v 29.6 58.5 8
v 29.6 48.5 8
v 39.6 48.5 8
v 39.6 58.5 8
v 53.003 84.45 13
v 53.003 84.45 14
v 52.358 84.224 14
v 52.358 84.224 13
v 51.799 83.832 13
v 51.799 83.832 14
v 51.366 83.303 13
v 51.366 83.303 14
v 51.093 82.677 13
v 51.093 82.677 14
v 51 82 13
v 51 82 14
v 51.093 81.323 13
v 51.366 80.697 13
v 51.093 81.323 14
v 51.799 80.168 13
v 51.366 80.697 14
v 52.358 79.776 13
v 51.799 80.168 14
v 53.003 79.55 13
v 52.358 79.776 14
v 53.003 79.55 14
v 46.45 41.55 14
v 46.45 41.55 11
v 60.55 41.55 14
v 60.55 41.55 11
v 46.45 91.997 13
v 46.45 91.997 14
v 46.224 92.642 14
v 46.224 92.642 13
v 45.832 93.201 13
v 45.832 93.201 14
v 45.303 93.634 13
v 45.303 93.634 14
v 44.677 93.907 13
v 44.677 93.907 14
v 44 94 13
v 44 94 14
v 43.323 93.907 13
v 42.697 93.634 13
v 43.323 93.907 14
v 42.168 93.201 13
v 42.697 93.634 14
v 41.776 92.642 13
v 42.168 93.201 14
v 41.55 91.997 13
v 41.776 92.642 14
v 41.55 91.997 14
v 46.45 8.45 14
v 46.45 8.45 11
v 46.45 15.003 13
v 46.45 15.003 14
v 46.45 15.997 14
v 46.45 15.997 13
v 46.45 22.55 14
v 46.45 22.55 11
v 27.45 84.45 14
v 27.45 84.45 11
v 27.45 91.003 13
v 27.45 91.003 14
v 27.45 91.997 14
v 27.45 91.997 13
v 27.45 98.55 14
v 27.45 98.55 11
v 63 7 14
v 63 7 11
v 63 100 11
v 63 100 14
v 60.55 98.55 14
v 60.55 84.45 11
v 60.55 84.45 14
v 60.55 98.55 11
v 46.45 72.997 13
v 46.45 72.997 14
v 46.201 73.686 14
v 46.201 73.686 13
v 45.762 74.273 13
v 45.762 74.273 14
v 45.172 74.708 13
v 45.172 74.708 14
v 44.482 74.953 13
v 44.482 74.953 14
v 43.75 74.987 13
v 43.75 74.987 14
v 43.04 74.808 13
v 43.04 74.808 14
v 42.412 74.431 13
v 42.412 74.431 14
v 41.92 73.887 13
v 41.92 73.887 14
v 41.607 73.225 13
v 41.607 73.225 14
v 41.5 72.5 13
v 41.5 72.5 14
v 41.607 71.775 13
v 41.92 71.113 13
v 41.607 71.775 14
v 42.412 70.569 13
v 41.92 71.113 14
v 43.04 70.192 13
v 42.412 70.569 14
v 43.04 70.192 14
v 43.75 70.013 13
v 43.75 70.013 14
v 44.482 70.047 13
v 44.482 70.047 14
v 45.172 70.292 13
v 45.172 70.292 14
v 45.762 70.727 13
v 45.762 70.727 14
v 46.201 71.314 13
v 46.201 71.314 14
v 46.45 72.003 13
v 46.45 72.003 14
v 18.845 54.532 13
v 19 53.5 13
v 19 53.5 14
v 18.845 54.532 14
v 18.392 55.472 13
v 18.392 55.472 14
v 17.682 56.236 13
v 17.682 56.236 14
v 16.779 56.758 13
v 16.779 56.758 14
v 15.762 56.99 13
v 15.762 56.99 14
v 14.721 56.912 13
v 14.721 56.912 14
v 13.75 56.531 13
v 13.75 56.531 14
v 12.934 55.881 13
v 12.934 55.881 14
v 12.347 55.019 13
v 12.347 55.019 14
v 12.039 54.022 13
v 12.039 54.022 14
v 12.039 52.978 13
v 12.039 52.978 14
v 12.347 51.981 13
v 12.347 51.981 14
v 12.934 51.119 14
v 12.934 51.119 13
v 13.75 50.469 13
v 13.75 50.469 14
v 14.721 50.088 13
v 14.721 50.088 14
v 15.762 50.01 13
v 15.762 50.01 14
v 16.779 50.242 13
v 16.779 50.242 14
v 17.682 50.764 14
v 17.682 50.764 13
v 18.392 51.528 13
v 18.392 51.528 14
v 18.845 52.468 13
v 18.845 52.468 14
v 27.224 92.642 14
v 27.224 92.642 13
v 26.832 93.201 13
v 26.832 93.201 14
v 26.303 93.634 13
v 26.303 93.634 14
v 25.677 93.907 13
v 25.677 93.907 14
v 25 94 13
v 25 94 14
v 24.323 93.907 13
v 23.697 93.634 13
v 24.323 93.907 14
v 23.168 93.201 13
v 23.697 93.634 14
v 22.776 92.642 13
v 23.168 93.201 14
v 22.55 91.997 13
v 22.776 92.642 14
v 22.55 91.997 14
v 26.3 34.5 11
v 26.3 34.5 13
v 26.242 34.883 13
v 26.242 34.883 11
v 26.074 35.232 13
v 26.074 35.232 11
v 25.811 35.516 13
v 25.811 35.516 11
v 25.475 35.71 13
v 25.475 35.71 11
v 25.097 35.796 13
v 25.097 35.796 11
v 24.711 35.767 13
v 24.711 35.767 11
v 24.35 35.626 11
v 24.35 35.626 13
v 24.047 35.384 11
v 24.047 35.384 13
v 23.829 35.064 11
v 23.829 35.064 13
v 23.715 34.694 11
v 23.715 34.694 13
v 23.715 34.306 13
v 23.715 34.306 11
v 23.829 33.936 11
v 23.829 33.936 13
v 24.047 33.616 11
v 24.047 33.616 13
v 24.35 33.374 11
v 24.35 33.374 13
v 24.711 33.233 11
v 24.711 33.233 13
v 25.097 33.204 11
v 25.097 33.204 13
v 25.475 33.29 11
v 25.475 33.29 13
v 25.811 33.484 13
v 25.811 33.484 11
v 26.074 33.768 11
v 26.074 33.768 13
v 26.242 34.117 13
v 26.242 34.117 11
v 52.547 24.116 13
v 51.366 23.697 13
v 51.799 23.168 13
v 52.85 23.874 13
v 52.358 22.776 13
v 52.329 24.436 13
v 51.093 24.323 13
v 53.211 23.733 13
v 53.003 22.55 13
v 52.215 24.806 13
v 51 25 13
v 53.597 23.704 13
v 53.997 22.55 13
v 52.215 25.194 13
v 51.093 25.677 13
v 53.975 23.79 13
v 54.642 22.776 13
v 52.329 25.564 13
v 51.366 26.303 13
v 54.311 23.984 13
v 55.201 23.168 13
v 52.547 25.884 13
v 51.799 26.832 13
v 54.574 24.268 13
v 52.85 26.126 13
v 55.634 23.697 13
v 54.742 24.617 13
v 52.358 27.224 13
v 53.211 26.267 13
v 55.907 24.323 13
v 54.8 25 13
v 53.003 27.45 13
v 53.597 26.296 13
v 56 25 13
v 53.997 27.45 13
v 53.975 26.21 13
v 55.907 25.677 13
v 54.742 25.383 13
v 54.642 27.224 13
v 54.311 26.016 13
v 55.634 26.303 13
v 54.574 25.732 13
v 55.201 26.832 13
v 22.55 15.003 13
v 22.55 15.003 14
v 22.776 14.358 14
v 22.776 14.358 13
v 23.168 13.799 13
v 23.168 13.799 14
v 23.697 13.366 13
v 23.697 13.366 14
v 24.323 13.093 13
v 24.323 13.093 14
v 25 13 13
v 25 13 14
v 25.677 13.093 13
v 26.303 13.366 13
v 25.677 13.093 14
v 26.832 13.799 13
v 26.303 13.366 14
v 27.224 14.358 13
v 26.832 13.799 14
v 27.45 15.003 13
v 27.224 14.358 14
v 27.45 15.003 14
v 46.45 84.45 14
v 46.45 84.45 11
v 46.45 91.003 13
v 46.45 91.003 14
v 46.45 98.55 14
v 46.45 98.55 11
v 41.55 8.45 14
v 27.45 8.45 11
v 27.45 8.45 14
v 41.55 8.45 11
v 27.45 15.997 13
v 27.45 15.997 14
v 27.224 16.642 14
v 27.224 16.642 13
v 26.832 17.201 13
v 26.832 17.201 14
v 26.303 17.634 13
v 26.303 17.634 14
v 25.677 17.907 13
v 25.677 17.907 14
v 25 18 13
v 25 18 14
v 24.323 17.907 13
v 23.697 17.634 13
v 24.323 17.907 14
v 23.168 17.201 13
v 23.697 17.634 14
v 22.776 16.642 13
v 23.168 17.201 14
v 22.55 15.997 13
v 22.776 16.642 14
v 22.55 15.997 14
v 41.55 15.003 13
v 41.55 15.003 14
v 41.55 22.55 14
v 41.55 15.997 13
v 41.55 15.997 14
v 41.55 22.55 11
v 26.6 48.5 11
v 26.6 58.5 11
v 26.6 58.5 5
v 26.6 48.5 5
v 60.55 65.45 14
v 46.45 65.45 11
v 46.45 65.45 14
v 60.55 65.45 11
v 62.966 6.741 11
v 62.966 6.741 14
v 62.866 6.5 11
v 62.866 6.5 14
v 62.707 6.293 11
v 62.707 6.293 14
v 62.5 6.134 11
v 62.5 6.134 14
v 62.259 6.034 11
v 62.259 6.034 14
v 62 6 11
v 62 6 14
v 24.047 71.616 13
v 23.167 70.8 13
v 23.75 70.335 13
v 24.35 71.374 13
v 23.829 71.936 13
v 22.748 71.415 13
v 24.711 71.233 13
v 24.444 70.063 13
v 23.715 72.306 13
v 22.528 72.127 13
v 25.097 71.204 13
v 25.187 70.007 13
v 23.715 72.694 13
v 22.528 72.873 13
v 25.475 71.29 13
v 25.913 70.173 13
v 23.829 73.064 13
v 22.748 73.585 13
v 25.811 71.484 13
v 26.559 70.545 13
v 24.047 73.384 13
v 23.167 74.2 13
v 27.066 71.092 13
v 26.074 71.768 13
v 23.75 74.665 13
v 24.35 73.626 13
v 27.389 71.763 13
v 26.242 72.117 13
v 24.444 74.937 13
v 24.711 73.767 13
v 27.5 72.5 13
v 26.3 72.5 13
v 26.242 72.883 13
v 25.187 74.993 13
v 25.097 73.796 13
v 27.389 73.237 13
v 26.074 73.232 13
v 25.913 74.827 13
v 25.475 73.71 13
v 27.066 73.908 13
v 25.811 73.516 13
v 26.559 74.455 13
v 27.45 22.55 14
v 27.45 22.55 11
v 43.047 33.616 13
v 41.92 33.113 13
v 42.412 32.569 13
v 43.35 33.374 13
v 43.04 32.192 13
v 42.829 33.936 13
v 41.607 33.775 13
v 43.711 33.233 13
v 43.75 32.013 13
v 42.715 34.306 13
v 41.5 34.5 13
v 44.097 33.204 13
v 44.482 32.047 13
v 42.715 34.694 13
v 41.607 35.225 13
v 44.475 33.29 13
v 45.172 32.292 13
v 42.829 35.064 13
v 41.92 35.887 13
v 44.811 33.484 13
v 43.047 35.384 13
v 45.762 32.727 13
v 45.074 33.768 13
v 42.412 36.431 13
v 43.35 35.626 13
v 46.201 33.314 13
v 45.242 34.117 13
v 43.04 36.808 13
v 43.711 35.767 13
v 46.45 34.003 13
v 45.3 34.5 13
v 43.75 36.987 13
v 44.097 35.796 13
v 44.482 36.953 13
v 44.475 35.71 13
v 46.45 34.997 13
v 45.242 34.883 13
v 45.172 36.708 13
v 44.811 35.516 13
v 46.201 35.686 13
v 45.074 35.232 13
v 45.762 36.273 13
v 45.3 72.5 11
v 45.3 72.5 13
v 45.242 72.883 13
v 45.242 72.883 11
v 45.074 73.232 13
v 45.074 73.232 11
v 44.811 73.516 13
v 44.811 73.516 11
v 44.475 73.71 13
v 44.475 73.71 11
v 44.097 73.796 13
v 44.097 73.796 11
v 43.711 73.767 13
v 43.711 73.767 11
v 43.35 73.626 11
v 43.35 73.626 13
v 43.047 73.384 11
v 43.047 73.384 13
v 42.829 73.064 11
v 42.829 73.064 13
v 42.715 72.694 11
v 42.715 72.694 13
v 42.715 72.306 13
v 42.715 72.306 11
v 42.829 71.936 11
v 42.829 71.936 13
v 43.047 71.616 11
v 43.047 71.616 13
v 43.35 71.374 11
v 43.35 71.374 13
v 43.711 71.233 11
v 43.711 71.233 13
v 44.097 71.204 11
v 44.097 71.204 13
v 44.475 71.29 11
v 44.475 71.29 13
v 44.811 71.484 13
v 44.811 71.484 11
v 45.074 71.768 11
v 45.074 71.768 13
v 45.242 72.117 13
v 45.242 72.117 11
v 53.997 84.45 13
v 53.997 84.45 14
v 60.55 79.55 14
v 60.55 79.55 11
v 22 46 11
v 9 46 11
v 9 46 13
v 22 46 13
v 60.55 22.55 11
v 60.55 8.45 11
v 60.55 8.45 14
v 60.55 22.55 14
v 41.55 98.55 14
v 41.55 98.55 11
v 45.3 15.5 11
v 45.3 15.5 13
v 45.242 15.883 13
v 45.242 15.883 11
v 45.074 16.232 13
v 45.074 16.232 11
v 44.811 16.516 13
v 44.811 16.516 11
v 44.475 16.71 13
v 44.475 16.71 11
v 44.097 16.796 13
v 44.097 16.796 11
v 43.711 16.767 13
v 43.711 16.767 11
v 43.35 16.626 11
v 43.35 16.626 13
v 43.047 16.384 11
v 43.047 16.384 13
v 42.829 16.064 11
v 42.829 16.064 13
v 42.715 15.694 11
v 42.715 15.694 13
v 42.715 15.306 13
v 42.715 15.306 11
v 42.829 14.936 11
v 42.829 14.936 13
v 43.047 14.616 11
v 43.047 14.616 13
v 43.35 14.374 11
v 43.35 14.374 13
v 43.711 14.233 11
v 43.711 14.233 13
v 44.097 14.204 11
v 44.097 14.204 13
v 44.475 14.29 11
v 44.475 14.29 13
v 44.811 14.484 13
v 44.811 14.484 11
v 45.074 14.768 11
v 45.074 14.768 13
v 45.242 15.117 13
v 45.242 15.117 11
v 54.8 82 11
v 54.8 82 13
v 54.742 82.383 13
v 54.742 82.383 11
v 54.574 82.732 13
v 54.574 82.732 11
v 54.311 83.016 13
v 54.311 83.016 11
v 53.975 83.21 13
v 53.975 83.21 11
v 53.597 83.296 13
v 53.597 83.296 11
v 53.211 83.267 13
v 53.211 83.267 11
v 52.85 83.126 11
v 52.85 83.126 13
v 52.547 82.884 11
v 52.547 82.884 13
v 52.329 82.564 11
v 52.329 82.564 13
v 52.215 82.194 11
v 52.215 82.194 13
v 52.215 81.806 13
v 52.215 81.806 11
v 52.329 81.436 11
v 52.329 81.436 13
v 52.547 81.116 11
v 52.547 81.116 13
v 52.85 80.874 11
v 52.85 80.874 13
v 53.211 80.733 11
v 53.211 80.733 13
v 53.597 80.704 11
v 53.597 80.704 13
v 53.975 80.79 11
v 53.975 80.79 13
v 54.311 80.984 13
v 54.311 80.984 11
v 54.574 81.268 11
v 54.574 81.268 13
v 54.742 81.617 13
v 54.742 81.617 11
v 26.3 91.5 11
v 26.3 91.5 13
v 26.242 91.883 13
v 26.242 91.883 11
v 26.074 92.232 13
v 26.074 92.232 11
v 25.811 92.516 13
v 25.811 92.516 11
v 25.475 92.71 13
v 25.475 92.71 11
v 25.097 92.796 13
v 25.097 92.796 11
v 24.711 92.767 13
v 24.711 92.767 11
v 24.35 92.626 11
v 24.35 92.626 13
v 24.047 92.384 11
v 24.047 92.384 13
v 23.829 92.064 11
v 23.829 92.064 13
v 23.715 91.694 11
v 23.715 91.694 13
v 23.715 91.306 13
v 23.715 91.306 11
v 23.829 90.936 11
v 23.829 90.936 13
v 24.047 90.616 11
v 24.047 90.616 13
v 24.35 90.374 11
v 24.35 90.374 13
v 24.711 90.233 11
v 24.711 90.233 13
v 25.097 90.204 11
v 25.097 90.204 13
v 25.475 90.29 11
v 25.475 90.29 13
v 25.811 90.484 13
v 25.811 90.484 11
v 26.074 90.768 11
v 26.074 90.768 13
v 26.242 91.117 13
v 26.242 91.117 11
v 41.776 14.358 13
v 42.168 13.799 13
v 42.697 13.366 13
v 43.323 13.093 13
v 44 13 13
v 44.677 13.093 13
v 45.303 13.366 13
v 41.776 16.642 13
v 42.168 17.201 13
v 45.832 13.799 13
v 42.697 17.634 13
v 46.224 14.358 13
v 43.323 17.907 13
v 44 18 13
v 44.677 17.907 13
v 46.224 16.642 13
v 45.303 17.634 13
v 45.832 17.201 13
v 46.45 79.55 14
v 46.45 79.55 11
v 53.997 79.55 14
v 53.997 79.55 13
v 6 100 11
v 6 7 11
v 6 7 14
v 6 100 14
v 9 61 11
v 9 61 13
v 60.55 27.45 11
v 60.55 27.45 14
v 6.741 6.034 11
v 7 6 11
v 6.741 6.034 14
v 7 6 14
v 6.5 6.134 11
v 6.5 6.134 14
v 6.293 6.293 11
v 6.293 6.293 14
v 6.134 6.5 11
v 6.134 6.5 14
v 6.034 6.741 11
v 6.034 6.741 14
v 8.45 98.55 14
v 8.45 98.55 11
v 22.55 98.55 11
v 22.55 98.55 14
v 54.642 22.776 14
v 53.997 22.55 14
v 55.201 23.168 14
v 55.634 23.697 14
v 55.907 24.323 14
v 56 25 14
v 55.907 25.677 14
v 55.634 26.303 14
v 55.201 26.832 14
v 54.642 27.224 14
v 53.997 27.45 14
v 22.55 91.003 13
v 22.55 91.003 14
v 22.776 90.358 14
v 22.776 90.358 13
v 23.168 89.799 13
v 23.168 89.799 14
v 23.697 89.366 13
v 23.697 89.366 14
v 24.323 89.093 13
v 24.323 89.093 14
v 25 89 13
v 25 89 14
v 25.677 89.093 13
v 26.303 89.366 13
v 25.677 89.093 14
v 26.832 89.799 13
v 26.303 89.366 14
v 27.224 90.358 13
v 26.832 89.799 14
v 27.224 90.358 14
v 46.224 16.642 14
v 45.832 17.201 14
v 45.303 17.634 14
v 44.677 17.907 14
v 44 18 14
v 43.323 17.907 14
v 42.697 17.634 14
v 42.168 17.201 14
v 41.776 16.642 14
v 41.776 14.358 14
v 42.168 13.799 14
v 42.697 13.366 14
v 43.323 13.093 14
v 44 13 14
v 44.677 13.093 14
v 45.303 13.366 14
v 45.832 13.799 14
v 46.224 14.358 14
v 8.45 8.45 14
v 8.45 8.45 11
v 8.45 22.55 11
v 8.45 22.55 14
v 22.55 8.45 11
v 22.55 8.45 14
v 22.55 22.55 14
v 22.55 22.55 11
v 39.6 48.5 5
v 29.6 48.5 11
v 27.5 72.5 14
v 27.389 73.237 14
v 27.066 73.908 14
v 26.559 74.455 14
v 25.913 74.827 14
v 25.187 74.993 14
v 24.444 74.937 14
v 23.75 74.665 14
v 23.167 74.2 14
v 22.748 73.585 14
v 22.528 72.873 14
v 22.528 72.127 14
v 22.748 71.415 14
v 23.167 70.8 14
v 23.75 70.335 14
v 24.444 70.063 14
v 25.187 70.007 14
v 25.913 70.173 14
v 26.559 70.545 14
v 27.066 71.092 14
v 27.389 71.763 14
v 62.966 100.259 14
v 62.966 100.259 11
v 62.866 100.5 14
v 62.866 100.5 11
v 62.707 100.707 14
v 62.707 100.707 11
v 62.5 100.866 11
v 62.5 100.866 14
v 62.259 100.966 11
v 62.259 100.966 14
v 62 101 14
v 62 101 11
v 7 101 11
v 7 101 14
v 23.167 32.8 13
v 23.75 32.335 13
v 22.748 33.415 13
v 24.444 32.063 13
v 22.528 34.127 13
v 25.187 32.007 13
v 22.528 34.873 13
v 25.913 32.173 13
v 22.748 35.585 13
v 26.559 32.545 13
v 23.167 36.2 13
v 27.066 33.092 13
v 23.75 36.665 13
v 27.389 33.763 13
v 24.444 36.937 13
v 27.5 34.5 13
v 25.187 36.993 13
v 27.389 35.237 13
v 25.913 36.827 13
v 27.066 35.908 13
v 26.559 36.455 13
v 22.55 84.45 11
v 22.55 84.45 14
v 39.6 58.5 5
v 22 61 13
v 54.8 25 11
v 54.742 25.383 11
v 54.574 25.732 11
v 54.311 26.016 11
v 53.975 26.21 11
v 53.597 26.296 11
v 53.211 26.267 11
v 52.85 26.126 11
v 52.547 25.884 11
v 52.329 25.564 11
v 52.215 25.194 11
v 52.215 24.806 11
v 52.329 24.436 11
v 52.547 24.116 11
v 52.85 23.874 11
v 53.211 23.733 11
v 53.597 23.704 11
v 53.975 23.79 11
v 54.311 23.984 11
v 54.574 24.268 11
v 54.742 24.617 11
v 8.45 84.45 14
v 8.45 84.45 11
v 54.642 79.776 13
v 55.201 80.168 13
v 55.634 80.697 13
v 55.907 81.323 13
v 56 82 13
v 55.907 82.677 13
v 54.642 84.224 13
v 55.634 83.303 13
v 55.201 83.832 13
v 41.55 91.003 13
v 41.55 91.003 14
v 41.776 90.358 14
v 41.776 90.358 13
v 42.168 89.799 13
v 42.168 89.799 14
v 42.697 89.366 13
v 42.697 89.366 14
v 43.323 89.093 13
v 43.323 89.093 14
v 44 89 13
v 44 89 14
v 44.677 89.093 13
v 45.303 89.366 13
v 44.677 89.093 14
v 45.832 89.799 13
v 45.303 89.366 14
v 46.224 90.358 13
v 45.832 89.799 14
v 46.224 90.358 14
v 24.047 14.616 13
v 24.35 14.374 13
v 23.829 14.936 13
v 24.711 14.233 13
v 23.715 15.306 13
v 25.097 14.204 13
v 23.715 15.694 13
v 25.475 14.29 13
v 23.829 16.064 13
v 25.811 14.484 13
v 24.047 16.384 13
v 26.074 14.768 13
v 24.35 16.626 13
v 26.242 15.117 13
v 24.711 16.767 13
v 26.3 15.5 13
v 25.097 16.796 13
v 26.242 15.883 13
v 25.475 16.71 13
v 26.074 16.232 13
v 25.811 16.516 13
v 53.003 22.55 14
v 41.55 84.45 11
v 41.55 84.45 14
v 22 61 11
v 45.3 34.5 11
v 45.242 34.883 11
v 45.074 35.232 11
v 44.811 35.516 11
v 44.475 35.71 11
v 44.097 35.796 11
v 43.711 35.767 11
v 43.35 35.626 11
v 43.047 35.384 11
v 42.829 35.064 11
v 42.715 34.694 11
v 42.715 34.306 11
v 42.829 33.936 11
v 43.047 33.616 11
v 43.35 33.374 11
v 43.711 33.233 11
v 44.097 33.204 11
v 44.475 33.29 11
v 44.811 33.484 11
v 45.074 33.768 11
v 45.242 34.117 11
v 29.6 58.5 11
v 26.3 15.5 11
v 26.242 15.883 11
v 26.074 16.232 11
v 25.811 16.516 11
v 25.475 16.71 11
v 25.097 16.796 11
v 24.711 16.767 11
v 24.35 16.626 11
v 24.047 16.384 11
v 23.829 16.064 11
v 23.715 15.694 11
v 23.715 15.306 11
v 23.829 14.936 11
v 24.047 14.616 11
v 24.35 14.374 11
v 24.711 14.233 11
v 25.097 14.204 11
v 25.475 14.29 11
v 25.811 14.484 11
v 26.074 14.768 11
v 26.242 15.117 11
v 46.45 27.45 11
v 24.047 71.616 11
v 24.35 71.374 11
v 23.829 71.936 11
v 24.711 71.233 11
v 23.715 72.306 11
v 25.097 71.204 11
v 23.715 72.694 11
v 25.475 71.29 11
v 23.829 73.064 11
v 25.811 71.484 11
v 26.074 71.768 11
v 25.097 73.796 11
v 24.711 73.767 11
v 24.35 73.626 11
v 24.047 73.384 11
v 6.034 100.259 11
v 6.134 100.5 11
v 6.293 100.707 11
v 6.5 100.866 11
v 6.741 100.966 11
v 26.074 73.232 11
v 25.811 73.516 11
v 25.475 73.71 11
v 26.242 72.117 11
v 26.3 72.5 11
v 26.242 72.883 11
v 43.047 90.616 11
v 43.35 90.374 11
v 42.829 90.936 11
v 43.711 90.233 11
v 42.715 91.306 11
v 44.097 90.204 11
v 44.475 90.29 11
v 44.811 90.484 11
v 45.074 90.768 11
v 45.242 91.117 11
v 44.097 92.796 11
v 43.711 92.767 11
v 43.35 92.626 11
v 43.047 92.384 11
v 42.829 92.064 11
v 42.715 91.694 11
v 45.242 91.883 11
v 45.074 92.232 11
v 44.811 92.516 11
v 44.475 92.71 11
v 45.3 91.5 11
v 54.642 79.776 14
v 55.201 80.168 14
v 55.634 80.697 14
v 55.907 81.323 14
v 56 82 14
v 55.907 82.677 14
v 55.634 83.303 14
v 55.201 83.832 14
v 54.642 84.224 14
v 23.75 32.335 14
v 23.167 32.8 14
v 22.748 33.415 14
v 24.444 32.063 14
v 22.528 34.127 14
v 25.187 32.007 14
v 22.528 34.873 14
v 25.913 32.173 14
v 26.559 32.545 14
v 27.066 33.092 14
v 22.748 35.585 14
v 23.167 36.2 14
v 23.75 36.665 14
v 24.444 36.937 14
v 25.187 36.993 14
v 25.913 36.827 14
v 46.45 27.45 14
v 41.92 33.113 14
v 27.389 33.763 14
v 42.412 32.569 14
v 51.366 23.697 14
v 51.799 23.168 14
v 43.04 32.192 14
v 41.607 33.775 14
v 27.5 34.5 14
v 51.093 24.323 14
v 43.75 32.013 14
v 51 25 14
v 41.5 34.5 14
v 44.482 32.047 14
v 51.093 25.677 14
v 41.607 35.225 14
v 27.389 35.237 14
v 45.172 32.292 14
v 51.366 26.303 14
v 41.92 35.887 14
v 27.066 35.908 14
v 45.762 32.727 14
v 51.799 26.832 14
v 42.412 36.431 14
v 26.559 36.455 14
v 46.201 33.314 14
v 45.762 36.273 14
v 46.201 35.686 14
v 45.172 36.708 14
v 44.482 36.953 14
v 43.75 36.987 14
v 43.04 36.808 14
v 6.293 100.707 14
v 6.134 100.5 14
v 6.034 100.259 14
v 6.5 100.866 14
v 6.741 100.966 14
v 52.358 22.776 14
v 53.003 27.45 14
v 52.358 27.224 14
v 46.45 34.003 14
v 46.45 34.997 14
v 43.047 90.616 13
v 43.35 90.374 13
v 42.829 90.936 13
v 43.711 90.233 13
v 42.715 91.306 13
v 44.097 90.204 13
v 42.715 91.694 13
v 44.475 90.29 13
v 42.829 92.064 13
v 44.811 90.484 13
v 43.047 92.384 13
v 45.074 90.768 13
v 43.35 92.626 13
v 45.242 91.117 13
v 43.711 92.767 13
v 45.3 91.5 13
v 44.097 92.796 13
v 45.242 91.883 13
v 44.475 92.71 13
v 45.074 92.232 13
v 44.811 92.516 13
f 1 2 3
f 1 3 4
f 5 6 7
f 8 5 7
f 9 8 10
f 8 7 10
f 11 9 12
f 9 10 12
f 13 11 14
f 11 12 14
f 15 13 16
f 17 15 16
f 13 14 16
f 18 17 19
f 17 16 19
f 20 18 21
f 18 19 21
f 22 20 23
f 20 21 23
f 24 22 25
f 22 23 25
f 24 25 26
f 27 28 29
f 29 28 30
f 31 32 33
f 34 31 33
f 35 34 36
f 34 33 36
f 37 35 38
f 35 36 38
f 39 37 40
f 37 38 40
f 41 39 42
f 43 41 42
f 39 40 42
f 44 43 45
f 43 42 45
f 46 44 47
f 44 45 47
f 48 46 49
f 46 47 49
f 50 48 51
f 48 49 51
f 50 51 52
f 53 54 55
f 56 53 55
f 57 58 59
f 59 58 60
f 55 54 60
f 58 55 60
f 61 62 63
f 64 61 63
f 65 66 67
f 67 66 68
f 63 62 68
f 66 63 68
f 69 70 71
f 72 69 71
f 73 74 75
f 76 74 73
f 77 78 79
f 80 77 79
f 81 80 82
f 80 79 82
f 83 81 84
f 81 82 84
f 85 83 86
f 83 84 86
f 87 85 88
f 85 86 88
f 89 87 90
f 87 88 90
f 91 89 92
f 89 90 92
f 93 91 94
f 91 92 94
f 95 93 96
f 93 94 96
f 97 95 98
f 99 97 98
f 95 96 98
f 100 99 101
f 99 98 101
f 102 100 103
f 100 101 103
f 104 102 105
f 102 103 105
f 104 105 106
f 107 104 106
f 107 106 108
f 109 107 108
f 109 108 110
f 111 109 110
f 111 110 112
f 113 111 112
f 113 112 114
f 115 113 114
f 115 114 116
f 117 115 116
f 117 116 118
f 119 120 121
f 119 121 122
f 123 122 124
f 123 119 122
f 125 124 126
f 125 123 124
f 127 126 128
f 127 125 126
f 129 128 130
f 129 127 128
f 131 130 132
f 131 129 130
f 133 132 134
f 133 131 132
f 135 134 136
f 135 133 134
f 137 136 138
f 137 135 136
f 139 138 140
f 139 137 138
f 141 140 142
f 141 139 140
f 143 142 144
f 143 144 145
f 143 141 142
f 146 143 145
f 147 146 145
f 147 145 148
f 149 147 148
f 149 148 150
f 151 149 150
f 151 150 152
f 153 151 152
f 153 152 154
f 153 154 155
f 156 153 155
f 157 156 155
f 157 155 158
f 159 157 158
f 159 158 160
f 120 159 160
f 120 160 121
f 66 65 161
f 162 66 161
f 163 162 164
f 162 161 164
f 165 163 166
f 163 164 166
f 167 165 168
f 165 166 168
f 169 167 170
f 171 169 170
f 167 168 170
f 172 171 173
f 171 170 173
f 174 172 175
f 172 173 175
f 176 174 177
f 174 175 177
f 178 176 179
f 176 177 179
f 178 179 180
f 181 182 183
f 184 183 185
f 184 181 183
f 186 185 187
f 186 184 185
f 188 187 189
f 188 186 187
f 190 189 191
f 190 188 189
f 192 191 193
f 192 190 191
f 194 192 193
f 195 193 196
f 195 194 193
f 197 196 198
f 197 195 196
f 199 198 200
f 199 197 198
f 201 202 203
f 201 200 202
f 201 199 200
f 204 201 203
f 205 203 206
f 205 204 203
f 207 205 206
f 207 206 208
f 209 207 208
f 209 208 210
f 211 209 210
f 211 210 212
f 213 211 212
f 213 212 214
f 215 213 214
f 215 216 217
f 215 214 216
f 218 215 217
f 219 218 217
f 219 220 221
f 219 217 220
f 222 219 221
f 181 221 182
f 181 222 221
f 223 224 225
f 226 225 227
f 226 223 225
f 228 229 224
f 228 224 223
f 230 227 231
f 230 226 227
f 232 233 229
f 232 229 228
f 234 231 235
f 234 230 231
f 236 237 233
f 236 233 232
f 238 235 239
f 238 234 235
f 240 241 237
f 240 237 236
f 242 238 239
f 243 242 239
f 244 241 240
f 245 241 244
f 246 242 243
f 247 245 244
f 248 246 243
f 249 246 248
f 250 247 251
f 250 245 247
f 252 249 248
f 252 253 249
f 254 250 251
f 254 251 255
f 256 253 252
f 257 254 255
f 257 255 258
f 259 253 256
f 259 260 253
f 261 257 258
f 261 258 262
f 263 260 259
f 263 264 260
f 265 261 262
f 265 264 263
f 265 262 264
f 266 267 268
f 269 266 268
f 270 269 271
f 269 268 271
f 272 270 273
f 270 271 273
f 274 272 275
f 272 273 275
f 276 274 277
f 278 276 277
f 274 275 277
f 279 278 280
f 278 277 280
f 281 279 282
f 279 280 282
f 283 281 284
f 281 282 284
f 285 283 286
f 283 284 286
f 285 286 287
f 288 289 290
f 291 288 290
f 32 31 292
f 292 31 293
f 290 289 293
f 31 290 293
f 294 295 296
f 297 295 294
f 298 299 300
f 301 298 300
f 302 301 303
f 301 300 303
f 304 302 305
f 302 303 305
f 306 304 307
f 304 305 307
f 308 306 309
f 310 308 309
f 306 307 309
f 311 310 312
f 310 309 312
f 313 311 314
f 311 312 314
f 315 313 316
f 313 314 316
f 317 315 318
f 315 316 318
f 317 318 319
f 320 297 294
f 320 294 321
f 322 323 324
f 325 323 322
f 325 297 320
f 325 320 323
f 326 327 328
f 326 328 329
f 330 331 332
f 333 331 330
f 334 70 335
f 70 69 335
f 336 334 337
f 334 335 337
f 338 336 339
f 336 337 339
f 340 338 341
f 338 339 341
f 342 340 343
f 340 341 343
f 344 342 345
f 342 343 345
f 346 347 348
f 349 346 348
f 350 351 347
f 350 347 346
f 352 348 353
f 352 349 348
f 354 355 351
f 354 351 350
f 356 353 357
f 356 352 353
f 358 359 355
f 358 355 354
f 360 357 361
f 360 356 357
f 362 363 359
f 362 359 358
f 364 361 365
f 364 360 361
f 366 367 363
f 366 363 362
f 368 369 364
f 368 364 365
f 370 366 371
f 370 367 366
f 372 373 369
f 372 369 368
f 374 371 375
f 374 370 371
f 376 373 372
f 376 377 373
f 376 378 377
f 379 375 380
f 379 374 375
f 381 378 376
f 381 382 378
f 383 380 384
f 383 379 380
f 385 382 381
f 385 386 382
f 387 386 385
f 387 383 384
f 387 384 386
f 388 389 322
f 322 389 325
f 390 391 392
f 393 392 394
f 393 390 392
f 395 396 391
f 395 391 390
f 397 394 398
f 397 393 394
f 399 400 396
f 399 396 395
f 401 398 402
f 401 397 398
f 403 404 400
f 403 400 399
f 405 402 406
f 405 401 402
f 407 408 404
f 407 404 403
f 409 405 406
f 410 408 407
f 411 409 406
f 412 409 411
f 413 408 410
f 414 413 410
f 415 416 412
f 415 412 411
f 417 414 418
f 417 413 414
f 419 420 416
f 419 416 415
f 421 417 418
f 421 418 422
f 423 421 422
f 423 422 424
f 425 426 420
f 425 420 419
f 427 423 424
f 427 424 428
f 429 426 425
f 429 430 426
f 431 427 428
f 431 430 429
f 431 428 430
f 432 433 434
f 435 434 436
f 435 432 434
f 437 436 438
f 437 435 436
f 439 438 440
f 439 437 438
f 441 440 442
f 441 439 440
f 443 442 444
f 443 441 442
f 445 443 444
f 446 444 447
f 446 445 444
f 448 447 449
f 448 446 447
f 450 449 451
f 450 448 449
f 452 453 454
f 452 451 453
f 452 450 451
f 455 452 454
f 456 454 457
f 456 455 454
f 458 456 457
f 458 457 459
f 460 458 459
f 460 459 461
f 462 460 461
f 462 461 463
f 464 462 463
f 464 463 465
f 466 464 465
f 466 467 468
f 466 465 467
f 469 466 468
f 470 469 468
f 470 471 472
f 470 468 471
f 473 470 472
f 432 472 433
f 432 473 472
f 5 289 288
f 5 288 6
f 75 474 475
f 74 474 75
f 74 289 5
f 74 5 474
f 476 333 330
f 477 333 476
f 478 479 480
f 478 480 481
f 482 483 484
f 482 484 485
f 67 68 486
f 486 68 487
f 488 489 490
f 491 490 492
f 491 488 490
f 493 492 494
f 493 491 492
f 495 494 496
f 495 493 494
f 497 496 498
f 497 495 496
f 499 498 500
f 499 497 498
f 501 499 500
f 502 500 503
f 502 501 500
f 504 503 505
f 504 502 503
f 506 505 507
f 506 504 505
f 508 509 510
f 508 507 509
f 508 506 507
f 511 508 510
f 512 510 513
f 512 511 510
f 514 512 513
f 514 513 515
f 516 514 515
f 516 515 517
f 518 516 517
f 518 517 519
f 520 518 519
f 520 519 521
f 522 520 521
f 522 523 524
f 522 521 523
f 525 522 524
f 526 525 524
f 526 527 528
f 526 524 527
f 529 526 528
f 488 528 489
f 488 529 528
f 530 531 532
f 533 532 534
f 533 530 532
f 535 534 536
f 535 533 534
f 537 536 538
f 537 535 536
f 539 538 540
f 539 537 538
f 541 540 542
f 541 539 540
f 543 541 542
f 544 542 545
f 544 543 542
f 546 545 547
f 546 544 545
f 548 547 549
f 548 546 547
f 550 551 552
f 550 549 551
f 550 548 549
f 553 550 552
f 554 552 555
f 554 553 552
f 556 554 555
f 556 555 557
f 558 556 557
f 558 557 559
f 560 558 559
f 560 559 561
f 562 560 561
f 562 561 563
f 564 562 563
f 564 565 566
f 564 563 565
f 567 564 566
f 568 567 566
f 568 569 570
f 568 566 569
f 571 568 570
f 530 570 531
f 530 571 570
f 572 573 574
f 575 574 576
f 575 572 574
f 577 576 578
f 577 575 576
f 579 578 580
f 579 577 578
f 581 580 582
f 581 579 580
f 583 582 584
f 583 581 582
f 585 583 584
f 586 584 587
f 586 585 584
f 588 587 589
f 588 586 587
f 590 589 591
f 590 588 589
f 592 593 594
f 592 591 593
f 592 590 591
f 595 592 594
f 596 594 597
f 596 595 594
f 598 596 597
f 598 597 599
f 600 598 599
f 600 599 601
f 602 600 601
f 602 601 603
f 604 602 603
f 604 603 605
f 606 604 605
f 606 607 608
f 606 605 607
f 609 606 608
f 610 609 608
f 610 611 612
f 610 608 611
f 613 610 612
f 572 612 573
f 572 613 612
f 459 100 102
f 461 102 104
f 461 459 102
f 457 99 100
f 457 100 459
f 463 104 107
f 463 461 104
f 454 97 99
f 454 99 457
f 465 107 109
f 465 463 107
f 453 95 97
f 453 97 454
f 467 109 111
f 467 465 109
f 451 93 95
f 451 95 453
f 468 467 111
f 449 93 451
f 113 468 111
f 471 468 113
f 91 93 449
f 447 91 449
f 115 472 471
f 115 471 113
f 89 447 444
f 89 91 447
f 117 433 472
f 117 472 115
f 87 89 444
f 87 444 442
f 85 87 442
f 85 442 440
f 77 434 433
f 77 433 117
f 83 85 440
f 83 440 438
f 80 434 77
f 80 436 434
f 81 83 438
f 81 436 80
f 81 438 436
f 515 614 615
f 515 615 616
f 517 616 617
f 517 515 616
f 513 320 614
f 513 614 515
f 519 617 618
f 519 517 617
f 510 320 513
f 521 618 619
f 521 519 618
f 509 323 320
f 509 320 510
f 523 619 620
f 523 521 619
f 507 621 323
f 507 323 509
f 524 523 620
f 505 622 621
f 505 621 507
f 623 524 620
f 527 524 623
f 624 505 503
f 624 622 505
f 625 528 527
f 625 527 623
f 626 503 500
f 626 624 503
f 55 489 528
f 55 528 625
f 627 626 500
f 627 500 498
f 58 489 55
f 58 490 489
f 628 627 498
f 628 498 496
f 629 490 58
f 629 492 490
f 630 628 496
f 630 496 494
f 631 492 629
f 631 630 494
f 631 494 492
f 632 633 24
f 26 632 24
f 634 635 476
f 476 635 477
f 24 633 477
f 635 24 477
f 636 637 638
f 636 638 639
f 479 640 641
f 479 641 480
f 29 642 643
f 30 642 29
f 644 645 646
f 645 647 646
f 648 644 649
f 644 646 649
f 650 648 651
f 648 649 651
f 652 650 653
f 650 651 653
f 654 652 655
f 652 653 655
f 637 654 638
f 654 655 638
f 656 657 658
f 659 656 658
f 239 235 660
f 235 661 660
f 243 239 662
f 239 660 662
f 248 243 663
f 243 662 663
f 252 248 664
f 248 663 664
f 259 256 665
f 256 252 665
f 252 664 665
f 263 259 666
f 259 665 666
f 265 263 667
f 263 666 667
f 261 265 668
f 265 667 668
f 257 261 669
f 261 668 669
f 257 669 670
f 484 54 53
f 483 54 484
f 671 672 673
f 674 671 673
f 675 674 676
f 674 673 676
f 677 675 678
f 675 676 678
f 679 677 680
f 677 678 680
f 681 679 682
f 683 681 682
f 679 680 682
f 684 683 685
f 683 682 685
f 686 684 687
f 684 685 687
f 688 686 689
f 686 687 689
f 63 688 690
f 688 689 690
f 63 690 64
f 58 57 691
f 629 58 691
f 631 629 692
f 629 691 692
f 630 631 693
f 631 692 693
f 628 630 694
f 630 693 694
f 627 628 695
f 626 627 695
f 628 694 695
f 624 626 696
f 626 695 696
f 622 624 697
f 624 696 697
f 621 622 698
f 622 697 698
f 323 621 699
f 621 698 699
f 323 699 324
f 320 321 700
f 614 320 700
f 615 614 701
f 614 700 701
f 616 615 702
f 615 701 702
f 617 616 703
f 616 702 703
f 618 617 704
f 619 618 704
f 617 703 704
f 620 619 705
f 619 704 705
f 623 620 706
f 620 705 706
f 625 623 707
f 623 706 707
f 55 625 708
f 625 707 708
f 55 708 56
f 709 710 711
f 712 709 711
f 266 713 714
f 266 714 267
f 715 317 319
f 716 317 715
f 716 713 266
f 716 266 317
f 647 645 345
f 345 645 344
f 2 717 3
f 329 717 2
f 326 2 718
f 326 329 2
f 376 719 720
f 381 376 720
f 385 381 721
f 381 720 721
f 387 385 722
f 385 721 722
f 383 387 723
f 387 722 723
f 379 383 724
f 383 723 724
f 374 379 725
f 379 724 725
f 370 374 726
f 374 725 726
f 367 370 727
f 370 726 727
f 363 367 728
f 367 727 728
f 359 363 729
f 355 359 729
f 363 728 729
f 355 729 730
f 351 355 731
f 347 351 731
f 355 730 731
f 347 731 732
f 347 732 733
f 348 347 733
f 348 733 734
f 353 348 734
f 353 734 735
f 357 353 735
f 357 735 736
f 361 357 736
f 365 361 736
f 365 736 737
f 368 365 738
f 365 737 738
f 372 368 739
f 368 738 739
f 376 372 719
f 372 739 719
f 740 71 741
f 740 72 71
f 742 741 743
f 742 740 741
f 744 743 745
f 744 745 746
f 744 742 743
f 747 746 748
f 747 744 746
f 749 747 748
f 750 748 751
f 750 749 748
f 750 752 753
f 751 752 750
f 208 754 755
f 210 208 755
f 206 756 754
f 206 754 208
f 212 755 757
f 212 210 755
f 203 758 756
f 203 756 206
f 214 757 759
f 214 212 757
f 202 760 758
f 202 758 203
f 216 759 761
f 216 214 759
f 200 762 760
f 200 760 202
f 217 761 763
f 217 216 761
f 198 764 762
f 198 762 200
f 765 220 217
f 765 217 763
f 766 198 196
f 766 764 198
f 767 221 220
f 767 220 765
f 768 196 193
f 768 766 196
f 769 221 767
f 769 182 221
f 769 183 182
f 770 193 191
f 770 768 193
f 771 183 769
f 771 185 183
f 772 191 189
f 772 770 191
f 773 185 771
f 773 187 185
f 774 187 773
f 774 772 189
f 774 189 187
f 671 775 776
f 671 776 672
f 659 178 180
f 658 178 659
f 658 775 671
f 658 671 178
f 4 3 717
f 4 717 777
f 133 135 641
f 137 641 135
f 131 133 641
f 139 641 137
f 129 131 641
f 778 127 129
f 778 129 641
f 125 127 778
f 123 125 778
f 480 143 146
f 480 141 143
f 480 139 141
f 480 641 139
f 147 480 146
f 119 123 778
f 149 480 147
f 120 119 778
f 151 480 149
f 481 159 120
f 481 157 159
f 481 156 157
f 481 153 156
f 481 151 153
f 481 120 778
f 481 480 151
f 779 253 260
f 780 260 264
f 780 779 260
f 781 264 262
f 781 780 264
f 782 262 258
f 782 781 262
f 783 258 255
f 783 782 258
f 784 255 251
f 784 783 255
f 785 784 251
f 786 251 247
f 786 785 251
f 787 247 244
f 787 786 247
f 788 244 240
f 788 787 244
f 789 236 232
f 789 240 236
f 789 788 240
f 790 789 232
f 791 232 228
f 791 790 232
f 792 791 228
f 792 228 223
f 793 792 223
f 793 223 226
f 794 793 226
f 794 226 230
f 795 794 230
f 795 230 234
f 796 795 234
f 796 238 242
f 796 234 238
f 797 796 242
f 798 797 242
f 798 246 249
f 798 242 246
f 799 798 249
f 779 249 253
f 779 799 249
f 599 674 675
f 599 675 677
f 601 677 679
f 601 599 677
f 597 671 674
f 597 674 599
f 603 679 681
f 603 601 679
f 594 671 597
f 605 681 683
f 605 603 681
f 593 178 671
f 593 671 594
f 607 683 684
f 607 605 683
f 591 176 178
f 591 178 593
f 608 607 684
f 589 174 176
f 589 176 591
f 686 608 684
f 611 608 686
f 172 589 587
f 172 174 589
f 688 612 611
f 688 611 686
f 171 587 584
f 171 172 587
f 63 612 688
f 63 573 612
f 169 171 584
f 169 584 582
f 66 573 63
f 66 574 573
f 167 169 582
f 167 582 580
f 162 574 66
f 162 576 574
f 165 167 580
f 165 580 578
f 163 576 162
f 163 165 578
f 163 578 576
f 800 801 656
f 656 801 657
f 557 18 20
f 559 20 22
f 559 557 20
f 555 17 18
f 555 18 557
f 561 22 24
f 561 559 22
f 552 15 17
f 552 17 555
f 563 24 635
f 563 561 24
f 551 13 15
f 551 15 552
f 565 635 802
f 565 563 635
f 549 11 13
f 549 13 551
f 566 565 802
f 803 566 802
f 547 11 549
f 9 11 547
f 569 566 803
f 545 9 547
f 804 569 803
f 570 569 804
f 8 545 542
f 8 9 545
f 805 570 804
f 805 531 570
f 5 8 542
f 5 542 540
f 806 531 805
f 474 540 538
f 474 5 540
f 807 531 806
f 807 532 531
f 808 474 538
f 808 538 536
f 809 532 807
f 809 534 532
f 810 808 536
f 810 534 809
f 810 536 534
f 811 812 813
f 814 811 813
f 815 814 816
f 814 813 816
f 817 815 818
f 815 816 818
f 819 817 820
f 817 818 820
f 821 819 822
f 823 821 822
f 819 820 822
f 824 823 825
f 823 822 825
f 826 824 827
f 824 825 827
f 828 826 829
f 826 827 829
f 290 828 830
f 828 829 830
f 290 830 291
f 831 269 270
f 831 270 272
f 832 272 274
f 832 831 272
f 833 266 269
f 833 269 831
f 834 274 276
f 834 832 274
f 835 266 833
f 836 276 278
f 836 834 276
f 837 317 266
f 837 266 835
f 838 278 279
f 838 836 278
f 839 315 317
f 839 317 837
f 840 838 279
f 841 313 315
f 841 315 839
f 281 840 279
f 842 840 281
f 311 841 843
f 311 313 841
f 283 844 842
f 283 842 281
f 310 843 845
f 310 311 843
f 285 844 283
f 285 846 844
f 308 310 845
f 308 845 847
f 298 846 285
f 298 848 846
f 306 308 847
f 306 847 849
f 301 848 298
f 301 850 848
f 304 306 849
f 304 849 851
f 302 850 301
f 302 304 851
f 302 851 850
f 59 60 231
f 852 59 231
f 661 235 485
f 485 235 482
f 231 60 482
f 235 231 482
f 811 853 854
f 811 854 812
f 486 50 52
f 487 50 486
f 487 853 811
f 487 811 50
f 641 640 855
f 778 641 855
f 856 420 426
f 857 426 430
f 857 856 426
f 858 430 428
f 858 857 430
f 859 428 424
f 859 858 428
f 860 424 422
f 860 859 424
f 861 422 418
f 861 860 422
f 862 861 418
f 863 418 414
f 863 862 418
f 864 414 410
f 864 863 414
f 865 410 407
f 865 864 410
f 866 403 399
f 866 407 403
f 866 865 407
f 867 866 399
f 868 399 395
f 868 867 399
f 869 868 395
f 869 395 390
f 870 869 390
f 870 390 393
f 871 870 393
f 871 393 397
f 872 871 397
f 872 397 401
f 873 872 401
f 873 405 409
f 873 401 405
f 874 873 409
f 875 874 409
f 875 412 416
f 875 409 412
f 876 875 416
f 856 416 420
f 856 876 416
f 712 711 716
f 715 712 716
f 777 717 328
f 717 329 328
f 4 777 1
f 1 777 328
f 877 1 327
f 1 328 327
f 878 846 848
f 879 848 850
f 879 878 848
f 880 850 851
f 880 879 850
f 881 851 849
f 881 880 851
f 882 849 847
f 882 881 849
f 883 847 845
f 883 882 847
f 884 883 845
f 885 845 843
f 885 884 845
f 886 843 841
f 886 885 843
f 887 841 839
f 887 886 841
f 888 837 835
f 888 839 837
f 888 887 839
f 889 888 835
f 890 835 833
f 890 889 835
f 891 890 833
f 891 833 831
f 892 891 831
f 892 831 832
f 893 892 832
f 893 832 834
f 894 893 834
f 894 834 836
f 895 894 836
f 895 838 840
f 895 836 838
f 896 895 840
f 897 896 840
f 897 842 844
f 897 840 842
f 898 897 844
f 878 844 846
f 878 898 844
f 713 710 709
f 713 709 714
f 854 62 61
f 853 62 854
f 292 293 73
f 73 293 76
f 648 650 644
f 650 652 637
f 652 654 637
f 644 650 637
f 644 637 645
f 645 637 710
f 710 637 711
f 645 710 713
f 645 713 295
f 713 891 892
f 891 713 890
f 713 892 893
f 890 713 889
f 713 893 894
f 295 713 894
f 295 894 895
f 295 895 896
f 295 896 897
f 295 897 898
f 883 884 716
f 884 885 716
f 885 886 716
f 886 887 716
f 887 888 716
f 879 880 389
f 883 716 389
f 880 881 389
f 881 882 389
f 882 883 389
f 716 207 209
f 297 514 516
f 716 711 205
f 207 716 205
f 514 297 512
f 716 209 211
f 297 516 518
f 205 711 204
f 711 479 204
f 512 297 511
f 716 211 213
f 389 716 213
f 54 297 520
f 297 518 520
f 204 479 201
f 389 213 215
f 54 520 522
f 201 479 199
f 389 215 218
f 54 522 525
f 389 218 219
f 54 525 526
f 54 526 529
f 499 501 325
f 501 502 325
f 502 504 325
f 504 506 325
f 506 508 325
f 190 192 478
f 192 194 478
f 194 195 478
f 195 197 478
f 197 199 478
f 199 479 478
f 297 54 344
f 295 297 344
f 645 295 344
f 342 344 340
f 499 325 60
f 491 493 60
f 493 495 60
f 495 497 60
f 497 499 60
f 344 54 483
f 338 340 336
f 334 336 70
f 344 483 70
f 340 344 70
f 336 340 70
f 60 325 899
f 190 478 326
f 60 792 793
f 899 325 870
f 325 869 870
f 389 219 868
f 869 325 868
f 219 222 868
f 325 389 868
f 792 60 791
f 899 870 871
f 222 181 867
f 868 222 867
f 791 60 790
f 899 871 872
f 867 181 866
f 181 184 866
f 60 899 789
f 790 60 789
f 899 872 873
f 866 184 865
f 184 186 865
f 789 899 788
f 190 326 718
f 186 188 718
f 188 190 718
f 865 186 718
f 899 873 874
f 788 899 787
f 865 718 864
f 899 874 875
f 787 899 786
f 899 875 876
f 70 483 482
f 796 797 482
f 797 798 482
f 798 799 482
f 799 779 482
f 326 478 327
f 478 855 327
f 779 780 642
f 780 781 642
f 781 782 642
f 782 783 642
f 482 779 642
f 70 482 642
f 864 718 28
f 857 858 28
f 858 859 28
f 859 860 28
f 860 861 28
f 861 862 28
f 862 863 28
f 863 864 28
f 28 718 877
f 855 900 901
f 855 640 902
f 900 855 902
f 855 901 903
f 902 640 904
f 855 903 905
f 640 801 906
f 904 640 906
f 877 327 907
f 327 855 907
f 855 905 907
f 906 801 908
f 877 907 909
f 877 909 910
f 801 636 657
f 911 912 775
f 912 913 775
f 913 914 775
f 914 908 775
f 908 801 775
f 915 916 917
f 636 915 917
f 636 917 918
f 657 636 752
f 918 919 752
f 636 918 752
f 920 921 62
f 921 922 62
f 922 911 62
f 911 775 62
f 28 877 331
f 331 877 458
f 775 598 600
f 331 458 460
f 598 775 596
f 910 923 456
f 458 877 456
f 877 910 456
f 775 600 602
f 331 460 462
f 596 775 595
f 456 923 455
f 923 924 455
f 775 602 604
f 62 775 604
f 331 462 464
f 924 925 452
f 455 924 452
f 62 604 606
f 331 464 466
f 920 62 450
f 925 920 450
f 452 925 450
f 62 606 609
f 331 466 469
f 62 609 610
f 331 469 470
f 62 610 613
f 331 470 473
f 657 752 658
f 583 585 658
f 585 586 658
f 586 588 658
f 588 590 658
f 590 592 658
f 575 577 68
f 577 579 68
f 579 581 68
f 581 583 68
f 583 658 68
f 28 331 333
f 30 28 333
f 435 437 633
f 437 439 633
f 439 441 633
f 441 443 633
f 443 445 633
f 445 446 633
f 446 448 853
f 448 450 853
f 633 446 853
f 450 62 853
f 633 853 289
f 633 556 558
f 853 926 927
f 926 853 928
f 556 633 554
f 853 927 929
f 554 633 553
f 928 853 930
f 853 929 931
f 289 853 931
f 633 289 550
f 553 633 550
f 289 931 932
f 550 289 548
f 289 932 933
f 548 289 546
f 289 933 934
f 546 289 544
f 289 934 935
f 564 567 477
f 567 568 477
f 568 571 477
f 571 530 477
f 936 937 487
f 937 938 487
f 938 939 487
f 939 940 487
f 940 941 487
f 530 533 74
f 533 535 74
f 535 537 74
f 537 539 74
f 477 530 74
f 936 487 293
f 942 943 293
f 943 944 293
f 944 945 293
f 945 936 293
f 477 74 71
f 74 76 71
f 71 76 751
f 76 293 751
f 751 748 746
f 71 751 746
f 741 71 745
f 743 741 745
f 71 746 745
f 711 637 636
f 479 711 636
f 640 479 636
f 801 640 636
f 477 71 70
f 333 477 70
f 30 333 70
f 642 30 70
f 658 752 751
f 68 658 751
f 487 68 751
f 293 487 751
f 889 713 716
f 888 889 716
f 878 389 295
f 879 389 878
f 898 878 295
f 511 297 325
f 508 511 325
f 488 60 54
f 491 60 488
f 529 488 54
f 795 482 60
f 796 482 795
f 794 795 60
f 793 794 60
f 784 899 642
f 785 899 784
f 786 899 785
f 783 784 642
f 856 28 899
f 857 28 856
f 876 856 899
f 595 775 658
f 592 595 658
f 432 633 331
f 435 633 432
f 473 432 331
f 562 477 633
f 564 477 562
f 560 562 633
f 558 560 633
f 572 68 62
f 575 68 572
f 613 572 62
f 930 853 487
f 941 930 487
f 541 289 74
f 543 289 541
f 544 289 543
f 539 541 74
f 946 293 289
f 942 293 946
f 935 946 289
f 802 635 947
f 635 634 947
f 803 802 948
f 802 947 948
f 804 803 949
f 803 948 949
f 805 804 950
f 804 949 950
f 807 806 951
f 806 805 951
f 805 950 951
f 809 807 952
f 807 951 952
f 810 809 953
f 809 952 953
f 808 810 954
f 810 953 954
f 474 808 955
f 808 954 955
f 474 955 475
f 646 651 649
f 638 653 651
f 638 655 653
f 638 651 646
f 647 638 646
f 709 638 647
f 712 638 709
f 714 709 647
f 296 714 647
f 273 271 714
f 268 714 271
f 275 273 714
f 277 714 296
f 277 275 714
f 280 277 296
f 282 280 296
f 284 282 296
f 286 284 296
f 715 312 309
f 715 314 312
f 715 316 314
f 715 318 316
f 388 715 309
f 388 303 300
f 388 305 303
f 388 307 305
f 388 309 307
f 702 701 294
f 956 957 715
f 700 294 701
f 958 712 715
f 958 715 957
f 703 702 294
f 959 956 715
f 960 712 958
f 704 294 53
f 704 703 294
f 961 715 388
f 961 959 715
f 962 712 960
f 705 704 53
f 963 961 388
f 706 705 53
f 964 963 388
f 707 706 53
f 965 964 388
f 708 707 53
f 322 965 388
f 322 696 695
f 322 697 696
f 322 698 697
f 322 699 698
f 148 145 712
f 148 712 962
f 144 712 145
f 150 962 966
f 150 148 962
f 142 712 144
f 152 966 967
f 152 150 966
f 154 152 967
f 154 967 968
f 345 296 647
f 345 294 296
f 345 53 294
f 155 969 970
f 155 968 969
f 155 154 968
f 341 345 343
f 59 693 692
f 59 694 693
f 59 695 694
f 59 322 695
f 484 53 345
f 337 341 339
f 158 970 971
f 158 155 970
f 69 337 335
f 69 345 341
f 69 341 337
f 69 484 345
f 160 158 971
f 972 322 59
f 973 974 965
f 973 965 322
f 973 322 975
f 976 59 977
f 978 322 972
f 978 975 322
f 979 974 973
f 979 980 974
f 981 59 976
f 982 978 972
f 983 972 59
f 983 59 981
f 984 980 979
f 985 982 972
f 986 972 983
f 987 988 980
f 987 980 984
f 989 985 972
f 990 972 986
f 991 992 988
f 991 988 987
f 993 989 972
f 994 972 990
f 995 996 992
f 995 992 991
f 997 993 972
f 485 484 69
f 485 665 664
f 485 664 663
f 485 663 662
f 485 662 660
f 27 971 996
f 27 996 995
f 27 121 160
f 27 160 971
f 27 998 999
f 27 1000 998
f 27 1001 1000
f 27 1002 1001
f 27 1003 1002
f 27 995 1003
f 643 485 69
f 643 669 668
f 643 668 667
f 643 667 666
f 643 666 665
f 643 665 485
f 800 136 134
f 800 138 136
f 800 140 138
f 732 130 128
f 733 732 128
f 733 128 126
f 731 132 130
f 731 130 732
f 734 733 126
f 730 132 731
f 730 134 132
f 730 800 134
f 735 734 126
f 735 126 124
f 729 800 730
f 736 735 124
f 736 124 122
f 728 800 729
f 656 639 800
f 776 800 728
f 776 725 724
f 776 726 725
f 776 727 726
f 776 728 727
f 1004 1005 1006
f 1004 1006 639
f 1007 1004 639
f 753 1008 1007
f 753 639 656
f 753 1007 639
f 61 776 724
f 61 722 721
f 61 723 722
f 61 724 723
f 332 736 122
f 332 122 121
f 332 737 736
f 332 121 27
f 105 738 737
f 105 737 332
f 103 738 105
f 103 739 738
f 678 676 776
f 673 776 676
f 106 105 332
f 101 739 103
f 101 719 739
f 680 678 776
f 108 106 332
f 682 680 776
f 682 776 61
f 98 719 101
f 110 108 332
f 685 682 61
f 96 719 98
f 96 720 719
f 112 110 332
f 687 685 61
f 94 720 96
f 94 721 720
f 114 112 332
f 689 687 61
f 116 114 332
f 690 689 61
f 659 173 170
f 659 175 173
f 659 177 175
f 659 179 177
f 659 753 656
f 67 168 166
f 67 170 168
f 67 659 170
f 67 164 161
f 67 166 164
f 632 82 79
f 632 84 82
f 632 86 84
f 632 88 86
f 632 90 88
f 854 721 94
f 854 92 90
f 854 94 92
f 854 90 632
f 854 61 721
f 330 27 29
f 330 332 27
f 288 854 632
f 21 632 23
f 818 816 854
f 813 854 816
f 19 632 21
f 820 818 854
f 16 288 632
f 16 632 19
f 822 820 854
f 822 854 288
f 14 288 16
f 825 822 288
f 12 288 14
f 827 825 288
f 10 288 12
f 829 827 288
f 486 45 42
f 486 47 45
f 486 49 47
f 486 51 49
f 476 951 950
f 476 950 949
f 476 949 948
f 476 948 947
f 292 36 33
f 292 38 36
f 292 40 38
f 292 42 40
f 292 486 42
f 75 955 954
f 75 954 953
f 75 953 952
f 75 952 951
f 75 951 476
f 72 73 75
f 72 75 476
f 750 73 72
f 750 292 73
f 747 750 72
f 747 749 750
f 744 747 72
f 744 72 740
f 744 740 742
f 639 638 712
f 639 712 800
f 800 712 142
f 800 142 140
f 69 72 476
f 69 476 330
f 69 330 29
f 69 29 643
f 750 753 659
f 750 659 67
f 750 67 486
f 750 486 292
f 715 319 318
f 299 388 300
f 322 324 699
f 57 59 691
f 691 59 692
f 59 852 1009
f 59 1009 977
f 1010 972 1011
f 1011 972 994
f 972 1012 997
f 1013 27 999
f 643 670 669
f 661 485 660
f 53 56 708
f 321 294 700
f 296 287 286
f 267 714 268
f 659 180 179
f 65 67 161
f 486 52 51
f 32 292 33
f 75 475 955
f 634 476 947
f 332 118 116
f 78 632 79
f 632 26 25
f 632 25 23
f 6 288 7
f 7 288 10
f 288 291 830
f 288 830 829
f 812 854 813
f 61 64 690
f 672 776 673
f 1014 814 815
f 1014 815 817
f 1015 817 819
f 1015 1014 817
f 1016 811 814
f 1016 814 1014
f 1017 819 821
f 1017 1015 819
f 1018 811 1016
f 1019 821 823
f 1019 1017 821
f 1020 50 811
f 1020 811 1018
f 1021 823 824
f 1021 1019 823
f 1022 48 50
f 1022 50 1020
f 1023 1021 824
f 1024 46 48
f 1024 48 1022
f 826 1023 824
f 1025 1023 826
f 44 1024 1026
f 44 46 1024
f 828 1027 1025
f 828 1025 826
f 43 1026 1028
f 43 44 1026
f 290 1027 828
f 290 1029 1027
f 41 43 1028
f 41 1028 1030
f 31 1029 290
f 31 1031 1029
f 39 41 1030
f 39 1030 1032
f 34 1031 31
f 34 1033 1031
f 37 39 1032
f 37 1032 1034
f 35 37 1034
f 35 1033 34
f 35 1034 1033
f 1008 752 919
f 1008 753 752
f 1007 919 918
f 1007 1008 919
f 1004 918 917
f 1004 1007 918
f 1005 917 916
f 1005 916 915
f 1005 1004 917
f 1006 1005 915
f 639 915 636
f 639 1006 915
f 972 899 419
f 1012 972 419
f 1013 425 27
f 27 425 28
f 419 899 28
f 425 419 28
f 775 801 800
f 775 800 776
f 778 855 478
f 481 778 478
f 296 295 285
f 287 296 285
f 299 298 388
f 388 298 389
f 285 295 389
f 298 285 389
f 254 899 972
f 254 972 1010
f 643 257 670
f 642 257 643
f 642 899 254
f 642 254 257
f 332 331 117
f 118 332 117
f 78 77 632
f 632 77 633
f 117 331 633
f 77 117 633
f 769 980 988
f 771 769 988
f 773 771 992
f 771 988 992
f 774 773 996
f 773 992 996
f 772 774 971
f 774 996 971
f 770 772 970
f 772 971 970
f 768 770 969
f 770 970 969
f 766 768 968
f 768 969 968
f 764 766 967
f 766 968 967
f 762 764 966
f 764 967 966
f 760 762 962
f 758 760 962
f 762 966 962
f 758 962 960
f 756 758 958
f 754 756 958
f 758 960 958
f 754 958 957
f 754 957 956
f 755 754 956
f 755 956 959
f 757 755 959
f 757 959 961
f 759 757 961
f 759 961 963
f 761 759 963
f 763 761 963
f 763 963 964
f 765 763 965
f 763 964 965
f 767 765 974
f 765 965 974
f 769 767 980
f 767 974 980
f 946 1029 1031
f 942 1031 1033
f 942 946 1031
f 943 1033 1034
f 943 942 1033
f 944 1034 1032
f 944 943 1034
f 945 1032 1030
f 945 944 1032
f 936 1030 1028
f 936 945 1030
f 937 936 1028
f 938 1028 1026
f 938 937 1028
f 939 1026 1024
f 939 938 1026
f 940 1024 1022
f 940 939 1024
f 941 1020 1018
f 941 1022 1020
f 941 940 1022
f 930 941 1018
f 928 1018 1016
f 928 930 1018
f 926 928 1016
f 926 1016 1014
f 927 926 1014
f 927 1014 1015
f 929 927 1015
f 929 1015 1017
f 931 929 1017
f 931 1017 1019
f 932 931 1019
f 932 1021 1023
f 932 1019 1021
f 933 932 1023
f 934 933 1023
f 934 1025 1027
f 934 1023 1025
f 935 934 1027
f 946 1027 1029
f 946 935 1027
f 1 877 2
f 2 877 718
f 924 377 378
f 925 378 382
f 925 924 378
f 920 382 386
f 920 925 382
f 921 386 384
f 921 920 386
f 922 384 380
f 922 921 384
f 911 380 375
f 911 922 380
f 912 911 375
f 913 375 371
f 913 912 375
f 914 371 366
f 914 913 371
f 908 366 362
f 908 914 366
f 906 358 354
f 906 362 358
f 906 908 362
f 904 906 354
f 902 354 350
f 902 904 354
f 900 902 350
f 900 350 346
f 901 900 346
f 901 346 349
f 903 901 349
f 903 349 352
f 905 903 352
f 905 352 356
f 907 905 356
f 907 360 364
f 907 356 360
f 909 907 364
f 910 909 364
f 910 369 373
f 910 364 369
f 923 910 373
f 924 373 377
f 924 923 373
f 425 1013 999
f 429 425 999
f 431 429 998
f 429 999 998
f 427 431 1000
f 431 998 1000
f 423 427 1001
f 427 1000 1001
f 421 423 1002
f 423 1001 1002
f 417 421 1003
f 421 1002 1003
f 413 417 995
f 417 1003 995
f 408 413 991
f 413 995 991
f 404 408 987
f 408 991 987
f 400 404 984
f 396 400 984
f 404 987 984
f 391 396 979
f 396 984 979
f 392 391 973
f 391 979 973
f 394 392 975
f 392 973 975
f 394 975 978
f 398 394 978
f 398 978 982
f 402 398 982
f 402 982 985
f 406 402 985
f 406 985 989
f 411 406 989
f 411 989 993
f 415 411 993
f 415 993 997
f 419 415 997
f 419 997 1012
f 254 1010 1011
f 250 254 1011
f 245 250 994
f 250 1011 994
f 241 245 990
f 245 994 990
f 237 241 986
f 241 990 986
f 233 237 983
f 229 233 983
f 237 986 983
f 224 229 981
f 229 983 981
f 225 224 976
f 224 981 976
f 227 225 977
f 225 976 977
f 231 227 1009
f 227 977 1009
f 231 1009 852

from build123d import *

# Parameters (mm, degrees)
SKETCH_W        = 57
SKETCH_H        = 95
SKETCH_R        = 3.5
SKETCH_R_2      = 1.3
SKETCH_W_2      = 14.1
SKETCH_H_2      = 14.1
PAD_DEPTH       = 3
SKETCH008_R     = 2.5
POCKET_DEPTH    = 1
SKETCH009_W     = 3
SKETCH009_H     = 10
PAD002_DEPTH    = 6
SKETCH010_W     = 13
SKETCH010_H     = 15
POCKET006_DEPTH = 2
SKETCH011_W     = 10
SKETCH011_H     = 3
PAD003_DEPTH    = 10
FILLET_R        = 1


with BuildPart() as part:
    # Sketch → Pad (new body)
    with BuildSketch(Plane.XY):
        with Locations((28.5, 47.5)):
            Rectangle(SKETCH_W, SKETCH_H)
        with Locations((9.5, 47.5)):
            Circle(SKETCH_R, mode=Mode.SUBTRACT)
        with Locations((19, 85.5)):
            Circle(SKETCH_R_2, mode=Mode.SUBTRACT)
        with Locations((38, 85.5)):
            Circle(SKETCH_R_2, mode=Mode.SUBTRACT)
        with Locations((38, 66.5)):
            Circle(SKETCH_R_2, mode=Mode.SUBTRACT)
        with Locations((19, 66.5)):
            Circle(SKETCH_R_2, mode=Mode.SUBTRACT)
        with Locations((38, 28.5)):
            Circle(SKETCH_R_2, mode=Mode.SUBTRACT)
        with Locations((19, 28.5)):
            Circle(SKETCH_R_2, mode=Mode.SUBTRACT)
        with Locations((19, 9.5)):
            Circle(SKETCH_R_2, mode=Mode.SUBTRACT)
        with Locations((38, 9.5)):
            Circle(SKETCH_R_2, mode=Mode.SUBTRACT)
        with Locations((47.5, 19)):
            Circle(SKETCH_R_2, mode=Mode.SUBTRACT)
        with Locations((47.5, 76)):
            Circle(SKETCH_R_2, mode=Mode.SUBTRACT)
        with Locations((9.5, 9.5)):
            Rectangle(SKETCH_W_2, SKETCH_H_2, mode=Mode.SUBTRACT)
        with Locations((28.5, 9.5)):
            Rectangle(SKETCH_W_2, SKETCH_H_2, mode=Mode.SUBTRACT)
        with Locations((47.5, 9.5)):
            Rectangle(SKETCH_W_2, SKETCH_H_2, mode=Mode.SUBTRACT)
        with Locations((47.5, 28.5)):
            Rectangle(SKETCH_W_2, SKETCH_H_2, mode=Mode.SUBTRACT)
        with Locations((47.5, 66.5)):
            Rectangle(SKETCH_W_2, SKETCH_H_2, mode=Mode.SUBTRACT)
        with Locations((47.5, 85.5)):
            Rectangle(SKETCH_W_2, SKETCH_H_2, mode=Mode.SUBTRACT)
        with Locations((28.5, 85.5)):
            Rectangle(SKETCH_W_2, SKETCH_H_2, mode=Mode.SUBTRACT)
        with Locations((9.5, 85.5)):
            Rectangle(SKETCH_W_2, SKETCH_H_2, mode=Mode.SUBTRACT)
    extrude(amount=PAD_DEPTH)

    # Sketch008 (on Face49 of Pad) → Pocket (cut)
    with BuildSketch(Plane.XY.offset(3)):
        with Locations((19, 28.5)):
            Circle(SKETCH008_R)
        with Locations((38, 28.5)):
            Circle(SKETCH008_R)
        with Locations((47.5, 19)):
            Circle(SKETCH008_R)
        with Locations((38, 9.5)):
            Circle(SKETCH008_R)
        with Locations((19, 9.5)):
            Circle(SKETCH008_R)
        with Locations((19, 66.5)):
            Circle(SKETCH008_R)
        with Locations((38, 85.5)):
            Circle(SKETCH008_R)
        with Locations((38, 66.5)):
            Circle(SKETCH008_R)
        with Locations((47.5, 76)):
            Circle(SKETCH008_R)
        with Locations((19, 85.5)):
            Circle(SKETCH008_R)
    extrude(amount=-POCKET_DEPTH, mode=Mode.SUBTRACT)

    # Sketch009 (on Face4 of Pocket) → Pad002 (join)
    with BuildSketch(Plane(origin=(0, 0, 0), x_dir=(1, 0, 0), z_dir=(0, 0, -1))):
        with Locations((22.1, -47.5)):
            Rectangle(SKETCH009_W, SKETCH009_H)
    extrude(amount=PAD002_DEPTH)

    # Sketch010 (on Face4 of Pad002) → Pocket006 (cut)
    with BuildSketch(Plane(origin=(0, 0, 0), x_dir=(1, 0, 0), z_dir=(0, 0, -1))):
        with Locations((9.5, -47.5)):
            Rectangle(SKETCH010_W, SKETCH010_H)
    extrude(amount=-POCKET006_DEPTH, mode=Mode.SUBTRACT)

    # Sketch011 (on Face32 of Pocket006) → Pad003 (join)
    with BuildSketch(Plane.YZ.offset(23.6)):
        with Locations((47.5, -4.5)):
            Rectangle(SKETCH011_W, SKETCH011_H)
    extrude(amount=PAD003_DEPTH)

    # Fillet
    fillet_edges = [part.edges().sort_by_distance(p)[0] for p in [
        (57, 0, 1.5),
        (0, 0, 1.5),
        (0, 95, 1.5),
        (57, 95, 1.5),
    ]]
    fillet(fillet_edges, radius=FILLET_R)


with BuildPart() as part_1:
    # Body placement: moved
    add(part.part.moved(Location((6, 6, 11))))


solid = part_1.part
